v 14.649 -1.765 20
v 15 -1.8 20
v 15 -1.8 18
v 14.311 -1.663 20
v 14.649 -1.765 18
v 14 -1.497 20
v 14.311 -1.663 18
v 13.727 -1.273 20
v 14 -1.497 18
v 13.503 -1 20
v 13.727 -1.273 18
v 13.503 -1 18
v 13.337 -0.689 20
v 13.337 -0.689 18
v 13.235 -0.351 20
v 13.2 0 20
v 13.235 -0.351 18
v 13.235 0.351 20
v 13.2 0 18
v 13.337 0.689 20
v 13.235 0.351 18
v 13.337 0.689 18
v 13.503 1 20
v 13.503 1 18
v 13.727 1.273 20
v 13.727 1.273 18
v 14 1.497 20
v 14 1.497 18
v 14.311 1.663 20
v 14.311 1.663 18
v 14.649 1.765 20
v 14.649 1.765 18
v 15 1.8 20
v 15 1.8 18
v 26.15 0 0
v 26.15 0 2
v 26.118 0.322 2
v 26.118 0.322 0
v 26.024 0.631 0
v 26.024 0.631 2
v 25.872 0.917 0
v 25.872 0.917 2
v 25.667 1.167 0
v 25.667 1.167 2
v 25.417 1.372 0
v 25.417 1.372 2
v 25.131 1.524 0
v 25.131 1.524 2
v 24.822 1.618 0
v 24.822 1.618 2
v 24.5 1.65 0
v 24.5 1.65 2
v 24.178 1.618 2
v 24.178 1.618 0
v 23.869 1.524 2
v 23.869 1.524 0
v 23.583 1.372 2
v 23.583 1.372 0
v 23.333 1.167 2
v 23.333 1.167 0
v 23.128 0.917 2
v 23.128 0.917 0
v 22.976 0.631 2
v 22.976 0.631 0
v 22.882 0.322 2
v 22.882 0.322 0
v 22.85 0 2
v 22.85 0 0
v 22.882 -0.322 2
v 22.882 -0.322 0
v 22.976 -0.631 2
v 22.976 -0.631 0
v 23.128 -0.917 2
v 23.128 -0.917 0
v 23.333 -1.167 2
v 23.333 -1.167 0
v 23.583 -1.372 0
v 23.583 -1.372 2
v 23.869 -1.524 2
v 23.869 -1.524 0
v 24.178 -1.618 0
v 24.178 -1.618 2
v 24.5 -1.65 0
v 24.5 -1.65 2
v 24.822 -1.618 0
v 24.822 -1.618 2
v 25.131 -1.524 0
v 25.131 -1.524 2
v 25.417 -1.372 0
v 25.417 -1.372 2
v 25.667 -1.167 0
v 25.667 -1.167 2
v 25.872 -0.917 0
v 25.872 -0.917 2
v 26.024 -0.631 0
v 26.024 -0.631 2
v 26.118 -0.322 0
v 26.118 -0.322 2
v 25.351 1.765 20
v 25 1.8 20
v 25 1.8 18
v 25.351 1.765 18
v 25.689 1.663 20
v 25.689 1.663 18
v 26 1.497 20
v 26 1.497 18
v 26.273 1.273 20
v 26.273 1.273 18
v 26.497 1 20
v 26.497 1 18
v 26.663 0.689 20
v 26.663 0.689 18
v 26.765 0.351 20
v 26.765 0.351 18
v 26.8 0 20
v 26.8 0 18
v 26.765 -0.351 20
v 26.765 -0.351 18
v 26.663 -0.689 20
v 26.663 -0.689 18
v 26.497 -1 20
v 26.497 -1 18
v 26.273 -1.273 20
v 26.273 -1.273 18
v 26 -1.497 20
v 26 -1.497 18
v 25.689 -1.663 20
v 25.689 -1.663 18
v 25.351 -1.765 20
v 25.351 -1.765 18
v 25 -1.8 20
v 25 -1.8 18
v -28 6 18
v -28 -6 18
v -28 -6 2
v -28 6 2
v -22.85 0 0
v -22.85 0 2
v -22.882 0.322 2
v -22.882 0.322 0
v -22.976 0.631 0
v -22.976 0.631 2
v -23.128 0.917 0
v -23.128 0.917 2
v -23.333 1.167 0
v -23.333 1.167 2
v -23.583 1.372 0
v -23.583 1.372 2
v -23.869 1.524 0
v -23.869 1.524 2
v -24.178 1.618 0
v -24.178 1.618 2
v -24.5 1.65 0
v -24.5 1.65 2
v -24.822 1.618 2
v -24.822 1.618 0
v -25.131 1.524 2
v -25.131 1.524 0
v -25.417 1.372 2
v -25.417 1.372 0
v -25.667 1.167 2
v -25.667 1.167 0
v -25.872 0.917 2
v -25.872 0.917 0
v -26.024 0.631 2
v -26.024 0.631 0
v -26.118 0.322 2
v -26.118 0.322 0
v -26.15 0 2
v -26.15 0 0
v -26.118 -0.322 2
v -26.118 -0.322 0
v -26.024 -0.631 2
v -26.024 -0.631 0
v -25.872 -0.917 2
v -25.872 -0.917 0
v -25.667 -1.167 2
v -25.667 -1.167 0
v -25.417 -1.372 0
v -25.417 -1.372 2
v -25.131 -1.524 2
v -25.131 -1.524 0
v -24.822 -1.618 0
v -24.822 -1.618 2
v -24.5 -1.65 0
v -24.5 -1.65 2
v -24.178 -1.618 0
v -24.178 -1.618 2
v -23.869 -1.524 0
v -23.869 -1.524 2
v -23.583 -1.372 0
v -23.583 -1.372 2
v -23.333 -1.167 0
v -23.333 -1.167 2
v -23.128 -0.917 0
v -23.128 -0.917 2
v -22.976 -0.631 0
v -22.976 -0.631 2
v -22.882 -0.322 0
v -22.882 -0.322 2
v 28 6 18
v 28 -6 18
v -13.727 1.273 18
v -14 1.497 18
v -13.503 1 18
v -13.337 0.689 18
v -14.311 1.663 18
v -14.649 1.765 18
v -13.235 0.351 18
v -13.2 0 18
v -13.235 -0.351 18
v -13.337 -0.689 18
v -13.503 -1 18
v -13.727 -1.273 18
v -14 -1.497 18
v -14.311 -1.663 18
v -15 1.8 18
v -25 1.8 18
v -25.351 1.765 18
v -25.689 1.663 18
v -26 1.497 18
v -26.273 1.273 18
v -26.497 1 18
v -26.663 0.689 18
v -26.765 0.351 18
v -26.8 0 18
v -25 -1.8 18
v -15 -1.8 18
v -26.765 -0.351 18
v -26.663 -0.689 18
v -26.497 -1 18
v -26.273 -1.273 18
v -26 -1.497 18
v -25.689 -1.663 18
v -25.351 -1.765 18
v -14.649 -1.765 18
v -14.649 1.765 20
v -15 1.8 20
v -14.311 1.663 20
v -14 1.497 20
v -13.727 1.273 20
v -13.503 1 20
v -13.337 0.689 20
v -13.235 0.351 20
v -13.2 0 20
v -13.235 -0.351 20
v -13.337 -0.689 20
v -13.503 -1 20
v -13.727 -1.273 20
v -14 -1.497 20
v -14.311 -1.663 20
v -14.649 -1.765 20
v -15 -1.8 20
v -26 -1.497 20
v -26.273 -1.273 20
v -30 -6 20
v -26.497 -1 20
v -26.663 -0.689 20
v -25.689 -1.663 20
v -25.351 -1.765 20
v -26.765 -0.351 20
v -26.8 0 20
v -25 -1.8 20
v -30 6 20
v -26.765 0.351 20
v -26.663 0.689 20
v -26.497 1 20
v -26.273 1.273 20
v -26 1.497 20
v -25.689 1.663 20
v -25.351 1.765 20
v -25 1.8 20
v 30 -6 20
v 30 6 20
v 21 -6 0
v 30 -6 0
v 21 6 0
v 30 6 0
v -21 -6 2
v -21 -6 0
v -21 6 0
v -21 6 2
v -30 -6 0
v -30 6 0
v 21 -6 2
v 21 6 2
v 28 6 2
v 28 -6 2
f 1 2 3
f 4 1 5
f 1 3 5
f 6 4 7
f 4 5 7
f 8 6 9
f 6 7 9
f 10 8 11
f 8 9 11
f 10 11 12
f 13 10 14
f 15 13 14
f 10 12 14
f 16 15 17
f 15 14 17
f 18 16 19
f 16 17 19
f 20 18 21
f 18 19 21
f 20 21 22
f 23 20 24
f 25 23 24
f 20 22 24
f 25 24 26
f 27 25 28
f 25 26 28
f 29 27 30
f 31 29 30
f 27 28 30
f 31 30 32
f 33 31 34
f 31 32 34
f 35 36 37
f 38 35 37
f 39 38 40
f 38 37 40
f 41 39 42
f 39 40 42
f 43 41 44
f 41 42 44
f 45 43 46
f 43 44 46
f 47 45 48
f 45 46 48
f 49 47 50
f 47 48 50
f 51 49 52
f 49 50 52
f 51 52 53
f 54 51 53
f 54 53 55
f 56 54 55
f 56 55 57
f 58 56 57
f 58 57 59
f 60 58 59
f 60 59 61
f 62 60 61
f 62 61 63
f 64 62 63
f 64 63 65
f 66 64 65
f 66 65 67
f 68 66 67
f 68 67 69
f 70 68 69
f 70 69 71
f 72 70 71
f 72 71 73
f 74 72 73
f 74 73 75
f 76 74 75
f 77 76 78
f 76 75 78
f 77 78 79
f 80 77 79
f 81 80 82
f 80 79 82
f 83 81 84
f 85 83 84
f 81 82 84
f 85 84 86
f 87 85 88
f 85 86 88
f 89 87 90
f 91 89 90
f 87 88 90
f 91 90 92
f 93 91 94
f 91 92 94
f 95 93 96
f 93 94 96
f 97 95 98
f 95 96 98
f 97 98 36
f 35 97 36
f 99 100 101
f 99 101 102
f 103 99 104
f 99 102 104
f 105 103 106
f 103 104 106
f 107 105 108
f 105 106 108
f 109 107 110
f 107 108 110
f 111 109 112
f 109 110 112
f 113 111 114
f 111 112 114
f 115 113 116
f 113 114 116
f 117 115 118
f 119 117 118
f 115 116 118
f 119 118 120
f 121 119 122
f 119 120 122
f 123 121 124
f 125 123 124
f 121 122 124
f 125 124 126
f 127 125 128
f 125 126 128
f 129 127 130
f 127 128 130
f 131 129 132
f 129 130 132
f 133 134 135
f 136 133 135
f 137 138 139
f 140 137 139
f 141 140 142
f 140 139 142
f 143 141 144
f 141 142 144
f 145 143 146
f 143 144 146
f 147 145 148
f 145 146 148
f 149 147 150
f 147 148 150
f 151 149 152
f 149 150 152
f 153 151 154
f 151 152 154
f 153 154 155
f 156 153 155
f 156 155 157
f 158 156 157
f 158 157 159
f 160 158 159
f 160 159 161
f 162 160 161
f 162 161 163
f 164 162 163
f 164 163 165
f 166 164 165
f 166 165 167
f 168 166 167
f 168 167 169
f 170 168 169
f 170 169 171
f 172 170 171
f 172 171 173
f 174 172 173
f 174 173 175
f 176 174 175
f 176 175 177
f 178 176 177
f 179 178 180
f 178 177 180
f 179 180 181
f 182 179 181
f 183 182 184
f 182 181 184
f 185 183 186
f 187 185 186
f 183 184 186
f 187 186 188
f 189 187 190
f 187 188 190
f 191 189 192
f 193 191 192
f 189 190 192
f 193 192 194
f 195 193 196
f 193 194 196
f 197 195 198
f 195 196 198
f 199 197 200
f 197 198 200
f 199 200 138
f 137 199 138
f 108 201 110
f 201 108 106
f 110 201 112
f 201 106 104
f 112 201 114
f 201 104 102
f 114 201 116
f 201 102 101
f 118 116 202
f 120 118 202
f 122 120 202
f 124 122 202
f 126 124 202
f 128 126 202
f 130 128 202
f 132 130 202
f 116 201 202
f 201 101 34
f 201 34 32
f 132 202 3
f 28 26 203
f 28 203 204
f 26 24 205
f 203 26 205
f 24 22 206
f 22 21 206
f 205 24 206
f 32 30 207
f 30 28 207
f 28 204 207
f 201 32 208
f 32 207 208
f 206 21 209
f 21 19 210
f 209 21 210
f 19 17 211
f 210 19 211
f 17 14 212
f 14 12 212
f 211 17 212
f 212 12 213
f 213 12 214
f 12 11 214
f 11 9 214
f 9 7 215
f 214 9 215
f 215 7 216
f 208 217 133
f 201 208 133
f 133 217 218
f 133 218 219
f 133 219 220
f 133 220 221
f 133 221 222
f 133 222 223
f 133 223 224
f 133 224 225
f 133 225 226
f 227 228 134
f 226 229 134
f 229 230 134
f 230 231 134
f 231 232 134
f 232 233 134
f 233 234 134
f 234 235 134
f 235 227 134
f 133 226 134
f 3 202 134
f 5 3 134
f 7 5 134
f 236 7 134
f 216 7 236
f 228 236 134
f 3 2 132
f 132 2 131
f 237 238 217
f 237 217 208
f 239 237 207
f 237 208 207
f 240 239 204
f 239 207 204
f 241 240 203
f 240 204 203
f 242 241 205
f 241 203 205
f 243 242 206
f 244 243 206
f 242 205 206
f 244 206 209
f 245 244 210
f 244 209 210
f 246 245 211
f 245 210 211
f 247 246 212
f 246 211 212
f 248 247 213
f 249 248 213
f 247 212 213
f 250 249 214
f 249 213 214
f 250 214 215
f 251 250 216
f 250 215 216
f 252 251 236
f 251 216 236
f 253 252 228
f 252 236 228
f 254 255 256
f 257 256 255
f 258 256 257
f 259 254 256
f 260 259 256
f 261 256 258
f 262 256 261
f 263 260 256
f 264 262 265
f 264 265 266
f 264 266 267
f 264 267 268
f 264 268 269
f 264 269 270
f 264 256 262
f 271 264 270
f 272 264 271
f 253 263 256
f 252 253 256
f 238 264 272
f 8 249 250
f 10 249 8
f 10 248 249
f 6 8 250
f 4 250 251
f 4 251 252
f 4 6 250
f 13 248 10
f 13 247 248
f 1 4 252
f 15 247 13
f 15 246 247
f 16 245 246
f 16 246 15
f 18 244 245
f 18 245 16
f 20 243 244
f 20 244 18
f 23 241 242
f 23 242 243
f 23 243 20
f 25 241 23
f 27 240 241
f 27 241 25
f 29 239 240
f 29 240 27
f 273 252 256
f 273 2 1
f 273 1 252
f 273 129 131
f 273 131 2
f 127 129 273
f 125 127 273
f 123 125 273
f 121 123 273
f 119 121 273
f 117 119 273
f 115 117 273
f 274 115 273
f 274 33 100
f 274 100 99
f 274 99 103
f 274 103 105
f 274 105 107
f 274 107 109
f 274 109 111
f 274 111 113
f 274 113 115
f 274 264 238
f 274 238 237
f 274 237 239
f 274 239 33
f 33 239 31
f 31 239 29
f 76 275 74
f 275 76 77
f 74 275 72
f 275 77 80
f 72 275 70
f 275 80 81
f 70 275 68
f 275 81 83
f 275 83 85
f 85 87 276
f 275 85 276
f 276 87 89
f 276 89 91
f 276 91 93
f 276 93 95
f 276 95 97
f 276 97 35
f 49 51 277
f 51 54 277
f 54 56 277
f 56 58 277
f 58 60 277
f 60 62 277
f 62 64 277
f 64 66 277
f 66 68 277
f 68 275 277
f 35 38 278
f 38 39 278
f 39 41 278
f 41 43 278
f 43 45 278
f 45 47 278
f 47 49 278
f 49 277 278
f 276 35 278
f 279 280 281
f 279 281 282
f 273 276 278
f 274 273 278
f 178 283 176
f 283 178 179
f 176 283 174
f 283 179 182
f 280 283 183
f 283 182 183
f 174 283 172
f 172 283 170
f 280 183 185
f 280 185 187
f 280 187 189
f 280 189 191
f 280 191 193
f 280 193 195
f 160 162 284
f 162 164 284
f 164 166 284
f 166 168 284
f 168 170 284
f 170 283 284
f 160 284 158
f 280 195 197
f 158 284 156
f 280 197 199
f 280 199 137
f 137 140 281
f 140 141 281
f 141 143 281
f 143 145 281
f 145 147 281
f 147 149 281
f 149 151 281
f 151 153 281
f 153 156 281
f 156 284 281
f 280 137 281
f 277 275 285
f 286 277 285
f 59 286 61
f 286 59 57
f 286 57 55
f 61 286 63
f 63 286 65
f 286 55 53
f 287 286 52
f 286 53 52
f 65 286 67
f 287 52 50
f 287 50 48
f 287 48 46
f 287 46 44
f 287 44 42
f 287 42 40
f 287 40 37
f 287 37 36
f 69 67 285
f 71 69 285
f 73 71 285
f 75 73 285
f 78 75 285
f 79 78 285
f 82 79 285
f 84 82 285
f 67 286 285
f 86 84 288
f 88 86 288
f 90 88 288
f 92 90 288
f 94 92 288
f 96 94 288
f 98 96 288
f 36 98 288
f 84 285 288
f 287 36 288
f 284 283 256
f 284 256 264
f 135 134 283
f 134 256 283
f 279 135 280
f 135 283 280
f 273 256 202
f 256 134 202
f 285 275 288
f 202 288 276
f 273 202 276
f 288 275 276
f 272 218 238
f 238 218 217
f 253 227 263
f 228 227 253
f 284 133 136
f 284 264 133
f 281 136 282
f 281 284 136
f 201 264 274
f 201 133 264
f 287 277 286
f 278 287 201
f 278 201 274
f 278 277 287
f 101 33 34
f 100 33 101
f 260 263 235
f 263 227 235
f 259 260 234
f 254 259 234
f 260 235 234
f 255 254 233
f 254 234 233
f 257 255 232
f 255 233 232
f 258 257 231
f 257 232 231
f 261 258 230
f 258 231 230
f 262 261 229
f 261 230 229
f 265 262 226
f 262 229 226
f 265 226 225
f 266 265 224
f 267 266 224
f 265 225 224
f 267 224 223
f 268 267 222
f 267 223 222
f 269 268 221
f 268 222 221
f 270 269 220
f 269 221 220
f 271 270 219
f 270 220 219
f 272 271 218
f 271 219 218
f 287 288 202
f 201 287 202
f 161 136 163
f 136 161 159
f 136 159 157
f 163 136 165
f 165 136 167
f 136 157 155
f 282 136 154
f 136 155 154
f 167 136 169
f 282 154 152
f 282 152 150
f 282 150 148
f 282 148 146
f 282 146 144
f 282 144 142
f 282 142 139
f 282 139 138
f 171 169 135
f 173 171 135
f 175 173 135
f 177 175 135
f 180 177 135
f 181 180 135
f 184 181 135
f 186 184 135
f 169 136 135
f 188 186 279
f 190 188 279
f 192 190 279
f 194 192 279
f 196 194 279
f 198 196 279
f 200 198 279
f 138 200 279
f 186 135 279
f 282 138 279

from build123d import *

# Parameters (mm, degrees)
F0_W      = 60
F0_H      = 12
F1_DEPTH  = 20
F2_W      = 42
F2_H      = 2
F3_DEPTH  = 12.001
F4_DEPTH  = 12.001
F6_D      = 3.3
F6_DEPTH  = 2.001
F8_D      = 3.3
F8_DEPTH  = 2.001
F10_D     = 3.6
F10_DEPTH = 12
F10_TIP   = 1.0815491142
F9_W      = 10
F9_H      = 3.6
F11_DEPTH = 12.5


with BuildPart() as f1:
    # F0 (on Top) → F1 (new body)
    with BuildSketch(Plane.XY):
        Rectangle(F0_W, F0_H)
    extrude(amount=F1_DEPTH)

    # F2 (on face) → F3 (cut, through all)
    with BuildSketch(Plane.XZ.offset(6)):
        Polygon((28, 18), (-28, 18), (-28, 2), (-21, 2), (21, 2), (28, 2), align=None)
        with Locations((0, 1)):
            Rectangle(F2_W, F2_H)
    extrude(amount=-F3_DEPTH, mode=Mode.SUBTRACT)

    # F2 (on face) → F4 (cut, through all)
    with BuildSketch(Plane.XZ.offset(6)):
        Polygon((28, 18), (-28, 18), (-28, 2), (-21, 2), (21, 2), (28, 2), align=None)
        with Locations((0, 1)):
            Rectangle(F2_W, F2_H)
    extrude(amount=-F4_DEPTH, mode=Mode.SUBTRACT)

    # F6 (through all, one way)
    with BuildSketch(Plane.XY.offset(2)):
        with Locations((-24.5, 0)):
            Circle(F6_D / 2)
    extrude(amount=-F6_DEPTH, mode=Mode.SUBTRACT)

    # F8 (through all, one way)
    with BuildSketch(Plane.XY.offset(2)):
        with Locations((24.5, 0)):
            Circle(F8_D / 2)
    extrude(amount=-F8_DEPTH, mode=Mode.SUBTRACT)

    # F10
    with Locations(Plane.XY.offset(20)):
        with Locations((-15, 0), (15, 0), (-25, 0), (25, 0)):
            Hole(F10_D / 2, depth=F10_DEPTH)
            with Locations((0, 0, -(F10_DEPTH + F10_TIP / 2))):  # 118° drill point
                Cone(0, F10_D / 2, F10_TIP, mode=Mode.SUBTRACT)

    # F9 (on face) → F11 (cut, symmetric)
    with BuildSketch(Plane.XY.offset(20)):
        with Locations((-20, 0)):
            Rectangle(F9_W, F9_H)
        with Locations((20, 0)):
            Rectangle(F9_W, F9_H)
    extrude(amount=F11_DEPTH, both=True, mode=Mode.SUBTRACT)


solid = f1.part
